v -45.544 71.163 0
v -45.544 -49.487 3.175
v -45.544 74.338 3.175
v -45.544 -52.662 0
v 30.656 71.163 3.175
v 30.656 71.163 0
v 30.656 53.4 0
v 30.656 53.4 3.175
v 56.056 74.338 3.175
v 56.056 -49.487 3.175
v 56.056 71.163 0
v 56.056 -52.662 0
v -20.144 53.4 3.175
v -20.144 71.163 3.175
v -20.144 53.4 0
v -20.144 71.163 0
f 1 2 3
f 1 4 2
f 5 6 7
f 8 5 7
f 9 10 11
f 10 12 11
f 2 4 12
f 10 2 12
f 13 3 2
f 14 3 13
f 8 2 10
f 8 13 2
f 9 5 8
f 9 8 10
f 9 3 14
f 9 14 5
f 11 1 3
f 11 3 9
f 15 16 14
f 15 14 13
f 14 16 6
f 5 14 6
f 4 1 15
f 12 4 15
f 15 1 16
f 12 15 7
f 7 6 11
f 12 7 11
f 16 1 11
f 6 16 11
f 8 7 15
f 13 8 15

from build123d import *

# Parameters (mm, degrees)
F0_W     = 101.6
F0_H     = 127
F1_DEPTH = 3.175
F2_SIZE  = 3.17499
F3_SIZE  = 3.17499
F4_W     = 31.75
F4_H     = 17.7633663237
F4_W_2   = 19.05
F5_DEPTH = 3.175


# Not quite as in the source:
# - a fillet or chamfer is up to 0.001 mm smaller than in the source, because OpenCascade refuses the exact size
# - a length typed as a fraction of an inch, garbled in the dataset ("3 / 203.2 mm" for 3/8 in), is restored


with BuildPart() as f1:
    # F0 (on Top) → F1 (new body)
    with BuildSketch(Plane.XY):
        with Locations((5.2556597352, 10.8384059966)):
            Rectangle(F0_W, F0_H)
    extrude(amount=F1_DEPTH)

    # F2 (size 3.175 in the source; OpenCascade refuses exactly that, so slightly less here)
    f2_edges = [f1.edges().sort_by_distance(p)[0] for p in [
        (5.25566, 74.338406, 0),
    ]]
    chamfer(f2_edges, length=F2_SIZE)

    # F3 (size 3.175 in the source; OpenCascade refuses exactly that, so slightly less here)
    f3_edges = [f1.edges().sort_by_distance(p)[0] for p in [
        (5.25566, -52.661594, 3.175),
    ]]
    chamfer(f3_edges, length=F3_SIZE)

    # F4 (on face) → F5 (cut)
    with BuildSketch(Plane(origin=(0, 0, 0), x_dir=(1, 0, 0), z_dir=(0, 0, -1))):
        with Locations((-4.2693402648, -62.2817228347)):
            Rectangle(F4_W, F4_H)
        with Locations((21.1306597352, -62.2817228347)):
            Rectangle(F4_W_2, F4_H)
    extrude(amount=-F5_DEPTH, mode=Mode.SUBTRACT)


solid = f1.part
